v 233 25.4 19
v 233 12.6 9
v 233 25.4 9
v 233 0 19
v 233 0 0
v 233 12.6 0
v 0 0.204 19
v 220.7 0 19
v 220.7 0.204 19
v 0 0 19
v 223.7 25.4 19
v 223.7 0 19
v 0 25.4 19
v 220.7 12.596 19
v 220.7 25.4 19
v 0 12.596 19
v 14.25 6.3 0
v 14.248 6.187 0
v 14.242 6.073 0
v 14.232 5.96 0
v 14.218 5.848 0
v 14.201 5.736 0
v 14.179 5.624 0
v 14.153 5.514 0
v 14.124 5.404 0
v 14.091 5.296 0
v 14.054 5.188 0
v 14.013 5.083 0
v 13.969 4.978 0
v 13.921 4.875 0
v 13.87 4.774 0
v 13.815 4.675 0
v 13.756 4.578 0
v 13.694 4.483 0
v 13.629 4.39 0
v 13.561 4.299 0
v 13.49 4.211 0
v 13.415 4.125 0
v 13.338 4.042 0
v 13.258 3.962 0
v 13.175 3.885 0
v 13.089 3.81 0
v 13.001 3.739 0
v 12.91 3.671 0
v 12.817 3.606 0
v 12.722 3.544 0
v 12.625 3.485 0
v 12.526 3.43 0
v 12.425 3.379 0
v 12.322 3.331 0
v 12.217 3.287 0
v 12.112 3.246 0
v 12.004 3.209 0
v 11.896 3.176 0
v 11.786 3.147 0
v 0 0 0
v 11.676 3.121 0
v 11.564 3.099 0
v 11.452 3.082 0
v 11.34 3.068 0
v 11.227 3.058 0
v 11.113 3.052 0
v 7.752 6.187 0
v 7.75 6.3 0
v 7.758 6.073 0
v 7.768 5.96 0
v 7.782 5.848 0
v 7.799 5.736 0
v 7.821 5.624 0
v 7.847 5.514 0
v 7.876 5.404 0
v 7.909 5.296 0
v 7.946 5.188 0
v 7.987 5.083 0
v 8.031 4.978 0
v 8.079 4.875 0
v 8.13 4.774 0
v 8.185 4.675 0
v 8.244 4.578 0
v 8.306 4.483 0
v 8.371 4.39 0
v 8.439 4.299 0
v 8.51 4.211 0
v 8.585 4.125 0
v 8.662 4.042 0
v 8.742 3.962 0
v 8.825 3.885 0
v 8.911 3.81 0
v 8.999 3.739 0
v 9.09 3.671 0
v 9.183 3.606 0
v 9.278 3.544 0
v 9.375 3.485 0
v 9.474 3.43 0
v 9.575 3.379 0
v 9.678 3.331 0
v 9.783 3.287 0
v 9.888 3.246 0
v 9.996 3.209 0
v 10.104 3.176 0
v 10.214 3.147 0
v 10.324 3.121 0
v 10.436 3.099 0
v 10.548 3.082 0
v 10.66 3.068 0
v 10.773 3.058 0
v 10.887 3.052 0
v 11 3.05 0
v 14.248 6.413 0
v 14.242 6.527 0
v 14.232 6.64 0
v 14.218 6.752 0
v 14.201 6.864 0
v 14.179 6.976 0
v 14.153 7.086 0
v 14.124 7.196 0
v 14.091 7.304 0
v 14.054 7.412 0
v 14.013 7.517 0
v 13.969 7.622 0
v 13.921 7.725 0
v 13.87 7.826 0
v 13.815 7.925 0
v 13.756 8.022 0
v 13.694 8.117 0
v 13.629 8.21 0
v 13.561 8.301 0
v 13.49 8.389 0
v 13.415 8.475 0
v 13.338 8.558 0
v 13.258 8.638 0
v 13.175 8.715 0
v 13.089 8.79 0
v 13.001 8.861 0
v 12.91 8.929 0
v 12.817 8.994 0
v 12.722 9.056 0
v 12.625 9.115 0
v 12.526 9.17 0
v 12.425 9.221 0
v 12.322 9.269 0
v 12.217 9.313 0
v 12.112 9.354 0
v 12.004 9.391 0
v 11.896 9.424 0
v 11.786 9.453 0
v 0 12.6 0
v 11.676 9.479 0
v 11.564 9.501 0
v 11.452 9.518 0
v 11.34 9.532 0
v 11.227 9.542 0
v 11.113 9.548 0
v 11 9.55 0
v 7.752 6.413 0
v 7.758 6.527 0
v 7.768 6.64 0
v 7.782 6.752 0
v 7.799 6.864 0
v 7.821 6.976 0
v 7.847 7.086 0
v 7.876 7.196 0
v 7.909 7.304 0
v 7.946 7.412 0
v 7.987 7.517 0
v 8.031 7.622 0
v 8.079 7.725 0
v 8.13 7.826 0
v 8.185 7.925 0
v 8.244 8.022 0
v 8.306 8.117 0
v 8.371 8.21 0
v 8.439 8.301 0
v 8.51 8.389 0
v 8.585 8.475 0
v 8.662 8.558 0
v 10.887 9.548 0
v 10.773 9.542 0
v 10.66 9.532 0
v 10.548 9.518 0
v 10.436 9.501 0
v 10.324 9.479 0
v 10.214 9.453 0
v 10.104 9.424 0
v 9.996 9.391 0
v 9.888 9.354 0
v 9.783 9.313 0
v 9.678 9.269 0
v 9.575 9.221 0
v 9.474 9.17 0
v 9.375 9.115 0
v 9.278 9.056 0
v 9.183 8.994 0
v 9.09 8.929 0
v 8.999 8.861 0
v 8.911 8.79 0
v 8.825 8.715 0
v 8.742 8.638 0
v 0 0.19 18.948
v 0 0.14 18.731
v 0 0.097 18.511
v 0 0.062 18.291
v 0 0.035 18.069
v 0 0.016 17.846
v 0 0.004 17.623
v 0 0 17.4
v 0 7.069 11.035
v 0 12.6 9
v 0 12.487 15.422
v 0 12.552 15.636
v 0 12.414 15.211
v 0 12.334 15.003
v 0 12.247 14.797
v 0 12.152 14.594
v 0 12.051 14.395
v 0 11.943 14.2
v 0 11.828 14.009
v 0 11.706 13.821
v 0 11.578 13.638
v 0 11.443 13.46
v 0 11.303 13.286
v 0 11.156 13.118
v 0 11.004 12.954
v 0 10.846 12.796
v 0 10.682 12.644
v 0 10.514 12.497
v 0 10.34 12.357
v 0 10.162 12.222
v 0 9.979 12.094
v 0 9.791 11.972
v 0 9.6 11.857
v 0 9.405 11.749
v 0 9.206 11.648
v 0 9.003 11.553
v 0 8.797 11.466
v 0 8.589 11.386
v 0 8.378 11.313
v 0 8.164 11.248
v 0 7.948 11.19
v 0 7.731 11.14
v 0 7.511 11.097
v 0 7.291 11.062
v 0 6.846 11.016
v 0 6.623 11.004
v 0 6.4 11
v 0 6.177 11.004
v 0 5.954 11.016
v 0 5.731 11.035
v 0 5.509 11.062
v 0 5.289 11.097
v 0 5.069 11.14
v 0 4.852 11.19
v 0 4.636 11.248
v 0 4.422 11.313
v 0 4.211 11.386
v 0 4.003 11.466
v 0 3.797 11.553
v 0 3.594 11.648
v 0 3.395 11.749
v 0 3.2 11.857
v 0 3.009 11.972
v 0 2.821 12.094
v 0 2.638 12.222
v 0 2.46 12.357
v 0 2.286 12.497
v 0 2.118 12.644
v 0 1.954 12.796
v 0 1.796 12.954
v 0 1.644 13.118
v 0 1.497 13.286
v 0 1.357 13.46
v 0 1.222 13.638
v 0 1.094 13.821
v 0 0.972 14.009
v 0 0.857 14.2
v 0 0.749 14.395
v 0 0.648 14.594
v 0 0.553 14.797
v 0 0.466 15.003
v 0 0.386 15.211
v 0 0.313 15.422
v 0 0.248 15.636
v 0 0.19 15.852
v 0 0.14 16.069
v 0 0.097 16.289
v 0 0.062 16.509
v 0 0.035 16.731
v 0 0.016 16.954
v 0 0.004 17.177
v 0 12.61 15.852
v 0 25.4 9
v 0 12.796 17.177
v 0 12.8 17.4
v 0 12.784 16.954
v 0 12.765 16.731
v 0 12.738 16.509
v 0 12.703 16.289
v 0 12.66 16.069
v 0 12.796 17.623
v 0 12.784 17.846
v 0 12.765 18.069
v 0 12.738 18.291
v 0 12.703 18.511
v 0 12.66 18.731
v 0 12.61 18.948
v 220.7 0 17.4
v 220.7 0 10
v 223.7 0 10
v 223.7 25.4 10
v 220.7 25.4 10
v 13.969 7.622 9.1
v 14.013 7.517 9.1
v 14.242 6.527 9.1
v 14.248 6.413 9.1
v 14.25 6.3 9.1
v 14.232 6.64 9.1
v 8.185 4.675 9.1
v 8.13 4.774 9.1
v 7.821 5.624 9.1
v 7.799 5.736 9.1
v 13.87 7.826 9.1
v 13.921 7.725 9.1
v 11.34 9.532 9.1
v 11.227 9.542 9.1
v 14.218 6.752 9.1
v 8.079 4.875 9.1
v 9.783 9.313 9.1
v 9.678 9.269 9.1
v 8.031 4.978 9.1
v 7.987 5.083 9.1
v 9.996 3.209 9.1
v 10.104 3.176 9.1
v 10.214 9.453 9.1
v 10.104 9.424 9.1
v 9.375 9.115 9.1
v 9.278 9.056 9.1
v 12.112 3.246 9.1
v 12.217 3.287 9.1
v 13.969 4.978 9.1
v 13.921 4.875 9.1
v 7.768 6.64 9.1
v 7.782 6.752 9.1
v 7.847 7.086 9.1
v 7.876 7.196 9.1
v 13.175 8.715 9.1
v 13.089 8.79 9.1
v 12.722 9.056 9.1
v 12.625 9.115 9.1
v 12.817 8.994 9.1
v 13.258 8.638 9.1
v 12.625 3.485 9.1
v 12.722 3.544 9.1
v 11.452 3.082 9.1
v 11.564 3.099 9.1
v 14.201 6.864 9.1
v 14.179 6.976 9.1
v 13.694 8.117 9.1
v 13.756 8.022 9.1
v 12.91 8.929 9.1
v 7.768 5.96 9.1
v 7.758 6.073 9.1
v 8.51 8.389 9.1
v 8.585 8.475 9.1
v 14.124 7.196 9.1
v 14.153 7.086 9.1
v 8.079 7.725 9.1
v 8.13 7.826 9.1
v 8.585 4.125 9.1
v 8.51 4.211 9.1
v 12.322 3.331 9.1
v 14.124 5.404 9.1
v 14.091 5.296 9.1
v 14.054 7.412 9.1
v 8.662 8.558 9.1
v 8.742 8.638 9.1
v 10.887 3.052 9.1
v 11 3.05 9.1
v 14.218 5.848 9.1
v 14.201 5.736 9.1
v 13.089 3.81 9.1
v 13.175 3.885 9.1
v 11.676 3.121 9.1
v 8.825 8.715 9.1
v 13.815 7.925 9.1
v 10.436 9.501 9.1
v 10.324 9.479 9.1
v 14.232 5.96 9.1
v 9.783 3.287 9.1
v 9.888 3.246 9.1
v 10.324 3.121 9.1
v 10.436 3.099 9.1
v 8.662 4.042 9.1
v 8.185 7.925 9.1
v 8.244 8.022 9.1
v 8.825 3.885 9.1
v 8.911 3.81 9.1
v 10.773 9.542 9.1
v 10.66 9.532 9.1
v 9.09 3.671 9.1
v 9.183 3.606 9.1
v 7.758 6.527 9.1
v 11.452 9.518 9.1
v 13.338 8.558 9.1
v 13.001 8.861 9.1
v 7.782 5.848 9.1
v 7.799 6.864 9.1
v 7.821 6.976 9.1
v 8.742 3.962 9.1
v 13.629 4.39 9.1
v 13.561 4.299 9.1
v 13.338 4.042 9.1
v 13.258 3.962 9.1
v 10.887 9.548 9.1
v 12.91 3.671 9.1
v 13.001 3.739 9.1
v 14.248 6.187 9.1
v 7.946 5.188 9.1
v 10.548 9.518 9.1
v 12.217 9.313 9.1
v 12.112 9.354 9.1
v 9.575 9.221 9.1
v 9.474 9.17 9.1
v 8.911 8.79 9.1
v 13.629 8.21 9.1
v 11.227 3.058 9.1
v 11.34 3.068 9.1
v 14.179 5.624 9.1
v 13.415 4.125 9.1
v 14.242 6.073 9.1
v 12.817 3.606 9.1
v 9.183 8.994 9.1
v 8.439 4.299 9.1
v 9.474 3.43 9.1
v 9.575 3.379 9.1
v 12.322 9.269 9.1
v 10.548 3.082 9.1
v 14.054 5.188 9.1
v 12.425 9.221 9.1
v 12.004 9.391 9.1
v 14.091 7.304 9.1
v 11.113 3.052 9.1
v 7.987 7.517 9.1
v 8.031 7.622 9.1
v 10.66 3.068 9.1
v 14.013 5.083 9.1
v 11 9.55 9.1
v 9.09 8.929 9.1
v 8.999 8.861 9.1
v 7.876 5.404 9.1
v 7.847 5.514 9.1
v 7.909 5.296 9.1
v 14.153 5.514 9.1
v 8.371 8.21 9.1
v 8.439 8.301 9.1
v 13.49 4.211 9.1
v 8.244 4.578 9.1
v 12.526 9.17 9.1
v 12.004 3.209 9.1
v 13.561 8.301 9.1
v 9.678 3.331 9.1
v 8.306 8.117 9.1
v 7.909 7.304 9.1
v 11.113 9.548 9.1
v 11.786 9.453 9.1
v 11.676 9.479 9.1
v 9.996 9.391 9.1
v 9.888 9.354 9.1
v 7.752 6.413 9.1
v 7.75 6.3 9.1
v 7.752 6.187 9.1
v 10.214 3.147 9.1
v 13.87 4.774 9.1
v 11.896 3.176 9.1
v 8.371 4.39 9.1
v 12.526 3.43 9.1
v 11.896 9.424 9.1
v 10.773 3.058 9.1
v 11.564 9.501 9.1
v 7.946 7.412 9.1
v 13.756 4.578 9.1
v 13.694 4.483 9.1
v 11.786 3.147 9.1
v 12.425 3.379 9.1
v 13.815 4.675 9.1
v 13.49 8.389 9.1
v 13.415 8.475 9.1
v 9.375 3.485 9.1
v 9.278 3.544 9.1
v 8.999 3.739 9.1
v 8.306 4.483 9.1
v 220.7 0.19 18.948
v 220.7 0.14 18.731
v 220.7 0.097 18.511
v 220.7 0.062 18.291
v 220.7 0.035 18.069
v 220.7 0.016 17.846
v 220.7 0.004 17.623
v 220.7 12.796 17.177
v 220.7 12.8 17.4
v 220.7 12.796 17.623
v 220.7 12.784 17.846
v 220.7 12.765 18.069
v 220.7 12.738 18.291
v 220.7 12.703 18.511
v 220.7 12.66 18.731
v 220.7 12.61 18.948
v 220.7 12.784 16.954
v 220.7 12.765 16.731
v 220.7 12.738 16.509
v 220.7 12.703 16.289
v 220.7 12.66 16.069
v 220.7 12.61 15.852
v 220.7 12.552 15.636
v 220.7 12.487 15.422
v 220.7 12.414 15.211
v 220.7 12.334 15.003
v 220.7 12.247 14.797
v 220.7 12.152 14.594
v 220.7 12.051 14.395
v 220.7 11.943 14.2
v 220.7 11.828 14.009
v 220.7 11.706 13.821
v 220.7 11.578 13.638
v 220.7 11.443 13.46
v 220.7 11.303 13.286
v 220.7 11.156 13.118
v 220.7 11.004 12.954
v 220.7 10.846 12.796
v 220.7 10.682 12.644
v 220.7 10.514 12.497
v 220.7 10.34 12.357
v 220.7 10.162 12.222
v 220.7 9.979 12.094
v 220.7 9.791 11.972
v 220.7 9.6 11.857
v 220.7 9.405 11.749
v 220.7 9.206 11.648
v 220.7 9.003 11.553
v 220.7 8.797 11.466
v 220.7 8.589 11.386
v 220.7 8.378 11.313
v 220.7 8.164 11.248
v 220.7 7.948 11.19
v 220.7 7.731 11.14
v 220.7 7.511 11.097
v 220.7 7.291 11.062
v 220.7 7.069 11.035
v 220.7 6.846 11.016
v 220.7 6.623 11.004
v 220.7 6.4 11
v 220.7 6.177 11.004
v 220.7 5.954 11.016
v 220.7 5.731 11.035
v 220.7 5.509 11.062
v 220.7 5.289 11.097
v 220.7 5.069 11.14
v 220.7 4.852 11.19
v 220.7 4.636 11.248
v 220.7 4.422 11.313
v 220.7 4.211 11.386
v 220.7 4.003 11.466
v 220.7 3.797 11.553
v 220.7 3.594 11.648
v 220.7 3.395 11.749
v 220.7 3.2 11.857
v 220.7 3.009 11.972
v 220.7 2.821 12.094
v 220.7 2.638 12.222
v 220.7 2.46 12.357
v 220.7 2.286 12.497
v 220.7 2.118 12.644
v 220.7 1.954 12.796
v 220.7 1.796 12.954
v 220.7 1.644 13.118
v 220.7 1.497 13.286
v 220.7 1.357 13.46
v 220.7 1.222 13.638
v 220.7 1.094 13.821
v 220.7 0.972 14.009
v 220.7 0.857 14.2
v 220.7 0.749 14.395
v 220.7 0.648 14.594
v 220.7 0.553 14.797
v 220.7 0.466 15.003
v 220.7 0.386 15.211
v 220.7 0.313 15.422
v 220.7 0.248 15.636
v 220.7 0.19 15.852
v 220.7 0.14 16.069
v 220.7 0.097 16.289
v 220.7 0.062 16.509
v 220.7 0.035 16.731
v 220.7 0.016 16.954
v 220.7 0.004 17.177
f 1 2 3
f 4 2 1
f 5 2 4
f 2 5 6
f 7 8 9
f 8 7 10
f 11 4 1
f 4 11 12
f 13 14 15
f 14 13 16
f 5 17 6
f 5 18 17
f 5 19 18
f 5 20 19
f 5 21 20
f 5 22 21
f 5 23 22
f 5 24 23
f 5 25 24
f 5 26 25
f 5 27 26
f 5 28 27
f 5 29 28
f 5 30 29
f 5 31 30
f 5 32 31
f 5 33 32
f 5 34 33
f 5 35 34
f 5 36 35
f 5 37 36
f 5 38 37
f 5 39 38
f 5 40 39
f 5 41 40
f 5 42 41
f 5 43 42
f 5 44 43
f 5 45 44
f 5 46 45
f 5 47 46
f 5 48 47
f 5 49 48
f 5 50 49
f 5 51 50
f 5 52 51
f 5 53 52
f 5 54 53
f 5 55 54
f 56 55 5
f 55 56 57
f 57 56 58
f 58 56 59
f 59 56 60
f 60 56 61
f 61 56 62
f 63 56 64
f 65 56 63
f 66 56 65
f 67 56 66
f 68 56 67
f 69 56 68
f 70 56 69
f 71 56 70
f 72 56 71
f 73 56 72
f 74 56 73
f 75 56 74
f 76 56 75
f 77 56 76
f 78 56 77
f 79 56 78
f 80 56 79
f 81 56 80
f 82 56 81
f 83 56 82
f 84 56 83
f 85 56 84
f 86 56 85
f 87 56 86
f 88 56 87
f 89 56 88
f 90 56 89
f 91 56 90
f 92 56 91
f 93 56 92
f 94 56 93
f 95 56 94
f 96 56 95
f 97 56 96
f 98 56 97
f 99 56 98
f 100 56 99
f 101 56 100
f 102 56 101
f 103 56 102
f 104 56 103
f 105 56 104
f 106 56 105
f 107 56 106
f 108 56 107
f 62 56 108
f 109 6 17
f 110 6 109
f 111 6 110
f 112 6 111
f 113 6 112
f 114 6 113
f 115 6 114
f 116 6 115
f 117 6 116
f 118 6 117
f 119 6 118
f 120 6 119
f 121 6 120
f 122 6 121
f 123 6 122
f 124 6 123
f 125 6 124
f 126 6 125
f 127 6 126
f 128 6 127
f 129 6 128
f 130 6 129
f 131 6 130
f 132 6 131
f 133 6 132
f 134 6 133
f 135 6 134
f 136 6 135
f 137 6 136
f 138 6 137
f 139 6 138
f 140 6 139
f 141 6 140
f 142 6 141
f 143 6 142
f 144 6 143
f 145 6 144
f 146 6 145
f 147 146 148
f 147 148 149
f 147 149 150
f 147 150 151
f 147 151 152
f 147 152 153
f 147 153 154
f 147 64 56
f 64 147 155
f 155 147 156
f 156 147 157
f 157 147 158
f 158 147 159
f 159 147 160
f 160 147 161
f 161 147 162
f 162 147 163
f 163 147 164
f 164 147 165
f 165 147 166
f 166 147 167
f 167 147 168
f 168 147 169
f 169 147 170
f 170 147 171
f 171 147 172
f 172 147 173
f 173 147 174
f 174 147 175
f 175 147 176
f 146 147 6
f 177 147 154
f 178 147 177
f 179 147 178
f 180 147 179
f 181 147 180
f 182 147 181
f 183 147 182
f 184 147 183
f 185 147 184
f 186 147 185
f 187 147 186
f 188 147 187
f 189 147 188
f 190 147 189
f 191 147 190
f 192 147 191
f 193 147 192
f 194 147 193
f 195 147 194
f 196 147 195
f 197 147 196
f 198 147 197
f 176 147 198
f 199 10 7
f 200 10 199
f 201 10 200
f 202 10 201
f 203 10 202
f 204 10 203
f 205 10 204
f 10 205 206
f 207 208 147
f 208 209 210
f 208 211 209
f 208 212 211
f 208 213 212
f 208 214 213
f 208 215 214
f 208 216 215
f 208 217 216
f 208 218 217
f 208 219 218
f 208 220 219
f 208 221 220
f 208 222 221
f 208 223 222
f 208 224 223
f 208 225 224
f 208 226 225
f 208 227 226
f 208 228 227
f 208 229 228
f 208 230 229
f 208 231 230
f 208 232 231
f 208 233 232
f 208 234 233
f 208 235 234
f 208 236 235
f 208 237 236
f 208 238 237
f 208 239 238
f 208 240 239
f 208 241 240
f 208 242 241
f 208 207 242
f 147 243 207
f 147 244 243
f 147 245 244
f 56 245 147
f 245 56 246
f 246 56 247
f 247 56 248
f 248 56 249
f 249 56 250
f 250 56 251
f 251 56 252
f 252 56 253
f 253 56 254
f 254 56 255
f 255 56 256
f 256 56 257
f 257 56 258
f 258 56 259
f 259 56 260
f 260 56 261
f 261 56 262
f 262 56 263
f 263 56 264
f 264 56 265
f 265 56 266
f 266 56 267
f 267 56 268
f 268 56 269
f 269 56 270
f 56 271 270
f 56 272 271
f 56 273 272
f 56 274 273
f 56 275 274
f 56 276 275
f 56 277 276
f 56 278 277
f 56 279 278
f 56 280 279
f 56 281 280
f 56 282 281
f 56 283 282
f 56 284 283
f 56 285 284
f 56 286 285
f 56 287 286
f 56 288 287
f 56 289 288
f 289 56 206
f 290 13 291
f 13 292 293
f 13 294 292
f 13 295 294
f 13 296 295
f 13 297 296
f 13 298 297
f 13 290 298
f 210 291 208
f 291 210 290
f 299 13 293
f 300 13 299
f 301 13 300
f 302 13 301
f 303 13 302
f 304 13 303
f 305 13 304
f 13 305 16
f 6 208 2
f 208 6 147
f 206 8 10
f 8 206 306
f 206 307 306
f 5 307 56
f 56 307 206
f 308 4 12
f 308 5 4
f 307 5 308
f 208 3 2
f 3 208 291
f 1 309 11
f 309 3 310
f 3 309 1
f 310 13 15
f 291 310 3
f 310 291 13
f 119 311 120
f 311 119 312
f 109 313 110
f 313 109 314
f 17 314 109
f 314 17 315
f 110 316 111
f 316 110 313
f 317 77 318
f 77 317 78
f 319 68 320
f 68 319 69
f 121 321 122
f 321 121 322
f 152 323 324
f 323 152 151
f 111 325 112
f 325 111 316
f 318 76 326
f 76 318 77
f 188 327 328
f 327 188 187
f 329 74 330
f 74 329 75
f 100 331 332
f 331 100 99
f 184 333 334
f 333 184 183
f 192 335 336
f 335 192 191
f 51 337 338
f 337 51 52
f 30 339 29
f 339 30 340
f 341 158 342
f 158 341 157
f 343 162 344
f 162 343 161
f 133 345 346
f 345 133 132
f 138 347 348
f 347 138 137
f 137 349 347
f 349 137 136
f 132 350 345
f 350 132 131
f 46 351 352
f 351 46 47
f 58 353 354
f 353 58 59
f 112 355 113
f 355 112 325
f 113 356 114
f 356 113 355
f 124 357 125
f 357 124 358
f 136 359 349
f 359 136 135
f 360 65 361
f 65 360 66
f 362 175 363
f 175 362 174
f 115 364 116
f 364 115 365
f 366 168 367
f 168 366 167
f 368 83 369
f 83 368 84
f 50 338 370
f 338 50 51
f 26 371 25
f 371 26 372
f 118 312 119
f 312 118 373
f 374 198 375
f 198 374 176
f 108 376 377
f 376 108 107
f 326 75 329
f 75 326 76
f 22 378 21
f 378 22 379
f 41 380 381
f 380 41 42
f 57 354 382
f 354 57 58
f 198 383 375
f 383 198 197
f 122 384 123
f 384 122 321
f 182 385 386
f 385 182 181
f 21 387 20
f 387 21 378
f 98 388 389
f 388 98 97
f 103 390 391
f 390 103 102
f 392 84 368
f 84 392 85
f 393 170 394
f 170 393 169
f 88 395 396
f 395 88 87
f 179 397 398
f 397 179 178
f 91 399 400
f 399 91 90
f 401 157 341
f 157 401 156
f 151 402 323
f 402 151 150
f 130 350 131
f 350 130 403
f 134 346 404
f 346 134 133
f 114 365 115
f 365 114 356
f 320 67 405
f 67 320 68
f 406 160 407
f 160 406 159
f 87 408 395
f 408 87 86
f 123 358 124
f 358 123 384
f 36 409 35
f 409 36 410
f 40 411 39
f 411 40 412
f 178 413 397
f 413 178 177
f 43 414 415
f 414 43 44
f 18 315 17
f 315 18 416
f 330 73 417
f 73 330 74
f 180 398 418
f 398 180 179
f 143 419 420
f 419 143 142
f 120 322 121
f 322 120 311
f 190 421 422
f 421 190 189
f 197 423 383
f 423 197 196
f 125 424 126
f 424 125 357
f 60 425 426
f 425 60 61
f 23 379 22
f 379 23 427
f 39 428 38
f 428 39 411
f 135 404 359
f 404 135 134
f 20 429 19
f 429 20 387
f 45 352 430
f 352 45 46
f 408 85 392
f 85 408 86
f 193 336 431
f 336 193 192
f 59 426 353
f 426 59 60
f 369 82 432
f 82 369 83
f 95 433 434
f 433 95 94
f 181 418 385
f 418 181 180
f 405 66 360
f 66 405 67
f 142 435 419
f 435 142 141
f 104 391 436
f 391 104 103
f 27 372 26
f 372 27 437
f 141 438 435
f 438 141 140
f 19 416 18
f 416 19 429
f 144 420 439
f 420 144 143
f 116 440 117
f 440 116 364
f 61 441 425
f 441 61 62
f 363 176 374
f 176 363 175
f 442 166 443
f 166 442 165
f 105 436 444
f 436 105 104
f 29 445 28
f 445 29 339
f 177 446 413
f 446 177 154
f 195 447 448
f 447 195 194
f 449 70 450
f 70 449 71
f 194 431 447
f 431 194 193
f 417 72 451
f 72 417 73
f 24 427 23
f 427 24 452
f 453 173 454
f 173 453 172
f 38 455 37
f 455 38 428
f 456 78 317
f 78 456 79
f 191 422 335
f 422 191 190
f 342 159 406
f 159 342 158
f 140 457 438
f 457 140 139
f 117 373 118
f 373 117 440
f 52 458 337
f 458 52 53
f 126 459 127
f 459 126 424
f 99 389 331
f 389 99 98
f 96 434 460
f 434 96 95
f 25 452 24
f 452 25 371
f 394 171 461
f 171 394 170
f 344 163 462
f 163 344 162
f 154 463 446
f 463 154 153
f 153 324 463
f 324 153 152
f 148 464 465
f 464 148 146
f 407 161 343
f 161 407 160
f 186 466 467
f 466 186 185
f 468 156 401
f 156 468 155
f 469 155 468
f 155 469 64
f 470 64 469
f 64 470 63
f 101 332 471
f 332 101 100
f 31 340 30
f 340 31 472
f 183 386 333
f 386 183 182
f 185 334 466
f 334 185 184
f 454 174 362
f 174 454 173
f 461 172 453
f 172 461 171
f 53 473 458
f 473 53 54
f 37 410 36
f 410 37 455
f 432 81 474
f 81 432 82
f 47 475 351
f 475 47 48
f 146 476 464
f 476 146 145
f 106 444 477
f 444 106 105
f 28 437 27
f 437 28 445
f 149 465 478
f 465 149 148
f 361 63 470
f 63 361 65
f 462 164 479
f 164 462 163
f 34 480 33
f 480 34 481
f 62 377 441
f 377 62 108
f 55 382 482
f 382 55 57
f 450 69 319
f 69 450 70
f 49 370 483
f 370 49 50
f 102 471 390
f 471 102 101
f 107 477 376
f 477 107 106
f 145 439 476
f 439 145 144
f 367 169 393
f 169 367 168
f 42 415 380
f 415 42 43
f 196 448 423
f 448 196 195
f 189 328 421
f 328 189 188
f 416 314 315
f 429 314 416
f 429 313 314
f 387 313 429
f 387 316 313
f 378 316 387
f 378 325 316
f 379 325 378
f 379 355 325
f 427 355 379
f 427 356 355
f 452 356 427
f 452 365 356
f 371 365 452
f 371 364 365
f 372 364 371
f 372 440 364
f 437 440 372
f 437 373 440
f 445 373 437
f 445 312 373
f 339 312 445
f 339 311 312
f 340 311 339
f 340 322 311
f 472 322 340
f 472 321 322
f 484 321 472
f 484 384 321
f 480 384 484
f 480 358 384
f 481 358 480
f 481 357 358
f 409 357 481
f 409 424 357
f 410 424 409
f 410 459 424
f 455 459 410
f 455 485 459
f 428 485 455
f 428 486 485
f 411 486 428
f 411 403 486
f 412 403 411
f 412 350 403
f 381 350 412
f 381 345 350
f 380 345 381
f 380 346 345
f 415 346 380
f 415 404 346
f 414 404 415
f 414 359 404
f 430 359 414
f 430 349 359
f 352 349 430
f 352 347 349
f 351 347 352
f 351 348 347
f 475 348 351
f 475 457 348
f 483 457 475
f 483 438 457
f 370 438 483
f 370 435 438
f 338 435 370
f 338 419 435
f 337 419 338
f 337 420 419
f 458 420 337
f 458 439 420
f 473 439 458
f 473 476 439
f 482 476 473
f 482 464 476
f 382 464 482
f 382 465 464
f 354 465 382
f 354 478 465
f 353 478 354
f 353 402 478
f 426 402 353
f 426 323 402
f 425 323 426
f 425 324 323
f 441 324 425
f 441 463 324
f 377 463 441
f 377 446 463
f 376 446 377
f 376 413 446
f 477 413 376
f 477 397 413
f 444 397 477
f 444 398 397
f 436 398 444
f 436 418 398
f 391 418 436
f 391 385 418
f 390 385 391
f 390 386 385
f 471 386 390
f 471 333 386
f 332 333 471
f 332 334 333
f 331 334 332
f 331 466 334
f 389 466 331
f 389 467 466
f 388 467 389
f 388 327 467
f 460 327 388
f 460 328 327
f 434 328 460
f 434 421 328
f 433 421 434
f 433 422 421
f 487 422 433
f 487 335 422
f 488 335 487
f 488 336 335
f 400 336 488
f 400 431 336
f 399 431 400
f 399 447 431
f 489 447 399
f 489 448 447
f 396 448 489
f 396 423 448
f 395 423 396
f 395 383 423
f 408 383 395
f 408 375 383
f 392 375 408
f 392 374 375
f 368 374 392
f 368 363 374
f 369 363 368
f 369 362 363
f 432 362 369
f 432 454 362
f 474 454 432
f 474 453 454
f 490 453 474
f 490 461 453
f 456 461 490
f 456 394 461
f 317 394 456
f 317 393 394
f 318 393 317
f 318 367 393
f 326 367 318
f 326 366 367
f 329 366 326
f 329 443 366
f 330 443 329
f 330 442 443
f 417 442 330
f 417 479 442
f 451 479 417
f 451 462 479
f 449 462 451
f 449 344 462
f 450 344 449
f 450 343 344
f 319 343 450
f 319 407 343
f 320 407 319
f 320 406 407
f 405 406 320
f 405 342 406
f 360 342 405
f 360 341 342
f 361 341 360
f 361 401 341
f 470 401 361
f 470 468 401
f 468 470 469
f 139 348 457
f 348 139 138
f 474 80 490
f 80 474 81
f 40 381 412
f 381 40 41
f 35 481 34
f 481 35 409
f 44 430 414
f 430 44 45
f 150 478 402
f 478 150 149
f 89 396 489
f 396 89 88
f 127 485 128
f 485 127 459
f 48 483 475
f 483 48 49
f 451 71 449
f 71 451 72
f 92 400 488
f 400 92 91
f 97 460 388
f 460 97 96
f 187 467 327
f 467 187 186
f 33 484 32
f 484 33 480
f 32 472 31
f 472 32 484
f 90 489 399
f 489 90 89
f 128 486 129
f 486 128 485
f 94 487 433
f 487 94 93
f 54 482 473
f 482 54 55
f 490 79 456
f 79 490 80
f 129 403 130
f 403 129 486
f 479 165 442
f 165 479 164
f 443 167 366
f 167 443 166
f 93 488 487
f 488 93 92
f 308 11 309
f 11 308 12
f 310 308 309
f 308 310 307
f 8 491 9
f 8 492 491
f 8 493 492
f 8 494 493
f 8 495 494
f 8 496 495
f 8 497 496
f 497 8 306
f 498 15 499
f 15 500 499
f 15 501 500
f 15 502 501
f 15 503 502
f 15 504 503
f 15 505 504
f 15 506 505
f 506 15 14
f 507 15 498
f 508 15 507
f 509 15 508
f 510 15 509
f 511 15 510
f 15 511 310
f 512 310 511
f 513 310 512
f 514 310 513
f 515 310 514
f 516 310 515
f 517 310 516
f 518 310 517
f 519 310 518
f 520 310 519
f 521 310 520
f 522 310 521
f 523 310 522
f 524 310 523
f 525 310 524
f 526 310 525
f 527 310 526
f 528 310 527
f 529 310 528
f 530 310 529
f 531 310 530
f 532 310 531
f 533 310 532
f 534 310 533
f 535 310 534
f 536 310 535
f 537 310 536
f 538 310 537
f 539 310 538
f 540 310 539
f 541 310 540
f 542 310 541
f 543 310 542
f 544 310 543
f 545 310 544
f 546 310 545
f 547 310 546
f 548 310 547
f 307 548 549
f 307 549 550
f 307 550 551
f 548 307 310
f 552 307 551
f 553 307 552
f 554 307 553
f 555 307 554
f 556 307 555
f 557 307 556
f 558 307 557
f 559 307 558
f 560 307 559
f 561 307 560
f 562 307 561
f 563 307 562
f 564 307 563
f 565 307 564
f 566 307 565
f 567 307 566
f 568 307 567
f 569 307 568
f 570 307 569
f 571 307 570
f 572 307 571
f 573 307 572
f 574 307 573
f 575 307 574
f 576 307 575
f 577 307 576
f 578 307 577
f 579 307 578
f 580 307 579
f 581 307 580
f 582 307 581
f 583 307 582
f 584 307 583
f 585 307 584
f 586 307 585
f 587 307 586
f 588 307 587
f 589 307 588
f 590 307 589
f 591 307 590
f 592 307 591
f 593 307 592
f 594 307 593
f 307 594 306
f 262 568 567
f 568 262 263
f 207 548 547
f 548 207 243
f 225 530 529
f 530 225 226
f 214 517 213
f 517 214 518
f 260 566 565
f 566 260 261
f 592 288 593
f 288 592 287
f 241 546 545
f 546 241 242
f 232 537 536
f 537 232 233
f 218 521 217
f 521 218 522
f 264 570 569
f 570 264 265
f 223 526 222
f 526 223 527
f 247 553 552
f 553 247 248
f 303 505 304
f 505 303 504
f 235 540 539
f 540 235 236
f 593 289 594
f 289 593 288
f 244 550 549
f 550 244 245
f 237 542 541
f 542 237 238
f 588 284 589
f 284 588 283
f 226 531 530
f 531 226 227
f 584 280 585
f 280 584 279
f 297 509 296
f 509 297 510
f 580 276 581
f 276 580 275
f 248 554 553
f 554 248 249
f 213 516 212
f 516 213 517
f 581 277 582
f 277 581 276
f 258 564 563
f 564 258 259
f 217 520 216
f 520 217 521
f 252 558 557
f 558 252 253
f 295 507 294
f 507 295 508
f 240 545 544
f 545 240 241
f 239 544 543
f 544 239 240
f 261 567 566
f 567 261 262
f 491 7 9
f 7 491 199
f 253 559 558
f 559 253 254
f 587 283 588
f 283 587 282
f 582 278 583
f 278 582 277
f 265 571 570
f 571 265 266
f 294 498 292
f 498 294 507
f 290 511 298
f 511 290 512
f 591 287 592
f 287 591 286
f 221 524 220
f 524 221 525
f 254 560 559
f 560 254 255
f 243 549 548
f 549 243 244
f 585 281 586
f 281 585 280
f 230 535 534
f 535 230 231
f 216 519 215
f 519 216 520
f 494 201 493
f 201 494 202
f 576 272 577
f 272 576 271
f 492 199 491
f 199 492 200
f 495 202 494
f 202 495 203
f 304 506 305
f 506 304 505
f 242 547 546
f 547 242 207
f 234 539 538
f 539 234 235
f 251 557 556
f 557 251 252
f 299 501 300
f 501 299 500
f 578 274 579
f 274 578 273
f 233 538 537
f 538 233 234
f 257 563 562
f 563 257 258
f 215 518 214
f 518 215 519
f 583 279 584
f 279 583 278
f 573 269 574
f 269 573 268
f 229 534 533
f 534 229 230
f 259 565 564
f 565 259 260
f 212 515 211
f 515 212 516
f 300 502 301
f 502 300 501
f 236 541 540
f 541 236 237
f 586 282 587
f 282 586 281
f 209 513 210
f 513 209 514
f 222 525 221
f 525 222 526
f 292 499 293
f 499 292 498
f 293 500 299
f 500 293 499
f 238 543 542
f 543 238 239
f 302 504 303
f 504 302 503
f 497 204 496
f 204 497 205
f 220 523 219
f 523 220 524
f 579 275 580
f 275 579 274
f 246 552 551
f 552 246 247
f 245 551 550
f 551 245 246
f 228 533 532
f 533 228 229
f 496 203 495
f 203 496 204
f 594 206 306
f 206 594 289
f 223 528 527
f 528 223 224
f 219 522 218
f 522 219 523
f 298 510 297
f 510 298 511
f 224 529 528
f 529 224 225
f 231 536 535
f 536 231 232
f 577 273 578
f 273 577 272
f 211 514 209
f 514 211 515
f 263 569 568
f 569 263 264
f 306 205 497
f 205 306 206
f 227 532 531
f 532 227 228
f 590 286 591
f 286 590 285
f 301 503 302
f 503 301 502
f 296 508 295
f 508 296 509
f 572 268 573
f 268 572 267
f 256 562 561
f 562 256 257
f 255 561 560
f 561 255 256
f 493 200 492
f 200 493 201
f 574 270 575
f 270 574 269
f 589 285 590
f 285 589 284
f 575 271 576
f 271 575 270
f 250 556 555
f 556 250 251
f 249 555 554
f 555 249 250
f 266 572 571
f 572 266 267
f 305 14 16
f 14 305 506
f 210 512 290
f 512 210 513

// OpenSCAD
length = 233;
back_hook_depth = 9.3;
back_hook_height = 10;
bottom_hole_diameter = 6.5;
bottom_hole_depth = 9.1;
bottom_hole_offset = 11;
back_thickness = 3;
back_protrusion = 1;
back_hor_protrusion = 6;
width = 6.3 * 2;
height = 6.3 * 2 - 3.6;
bar_diameter = 12.8;
thickness = 2;
$fn = 180;

difference() {
	union() {
		cube([length, width, height + back_hook_height]);
		translate([0, width, height]) {
			cube([length, bar_diameter, back_hook_height]);
		}
	}
	translate([bottom_hole_offset, width / 2, -0.1]) {
		cylinder(h=0.1 + bottom_hole_depth, r=bottom_hole_diameter / 2);
	}
	translate([length - back_thickness - back_hook_depth, -0.1, height + thickness - back_protrusion]) {
		cube([back_thickness, bar_diameter + width + 0.2, back_hook_height + 0.1]);
	}
	translate([-0.1, bar_diameter / 2, height + thickness + bar_diameter / 2]) {
		rotate([0, 90, 0]) {
			cylinder(h=length + 0.2 - back_thickness - back_hook_depth, r=bar_diameter / 2);
		}
	}
}
